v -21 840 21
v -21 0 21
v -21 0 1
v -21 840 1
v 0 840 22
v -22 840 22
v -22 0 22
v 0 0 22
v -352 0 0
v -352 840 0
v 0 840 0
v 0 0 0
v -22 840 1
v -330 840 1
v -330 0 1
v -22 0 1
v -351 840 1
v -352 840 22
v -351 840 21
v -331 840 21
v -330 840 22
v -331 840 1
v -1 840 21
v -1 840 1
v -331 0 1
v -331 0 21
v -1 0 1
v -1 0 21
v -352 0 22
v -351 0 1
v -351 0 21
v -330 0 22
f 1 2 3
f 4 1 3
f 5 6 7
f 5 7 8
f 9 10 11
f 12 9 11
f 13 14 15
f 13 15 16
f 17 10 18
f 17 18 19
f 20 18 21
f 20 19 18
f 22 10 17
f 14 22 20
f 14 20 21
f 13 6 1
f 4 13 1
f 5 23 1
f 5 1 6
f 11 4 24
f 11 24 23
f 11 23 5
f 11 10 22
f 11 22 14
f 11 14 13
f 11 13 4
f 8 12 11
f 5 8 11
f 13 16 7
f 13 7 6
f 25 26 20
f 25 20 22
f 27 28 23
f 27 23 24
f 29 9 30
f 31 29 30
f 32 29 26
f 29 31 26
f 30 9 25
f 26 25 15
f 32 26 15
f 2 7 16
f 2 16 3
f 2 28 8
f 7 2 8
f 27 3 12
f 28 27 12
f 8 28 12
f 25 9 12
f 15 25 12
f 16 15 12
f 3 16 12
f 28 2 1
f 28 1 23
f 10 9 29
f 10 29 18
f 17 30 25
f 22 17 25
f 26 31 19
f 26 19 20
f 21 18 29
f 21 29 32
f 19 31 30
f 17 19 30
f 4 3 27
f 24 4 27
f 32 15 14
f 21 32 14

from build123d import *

# Parameters (mm, degrees)
SKETCH_2_W          = 308
SKETCH_2_H          = 840
EXTRUDE_1_DEPTH     = 1
SKETCH_2_3_W        = 22
SKETCH_2_3_H        = 840
EXTRUDE_2_DEPTH     = 22
SKETCH_4_W          = 20
SKETCH_4_H          = 20
CUT_EXTRUDE_1_DEPTH = 840
SKETCH_4_3_W        = 20
SKETCH_4_3_H        = 20
CUT_EXTRUDE_2_DEPTH = 840


with BuildPart() as part:
    # 스케치2 → 보스-돌출1 (new body)
    with BuildSketch(Plane.XY):
        with Locations((-176, 420)):
            Rectangle(SKETCH_2_W, SKETCH_2_H)
    extrude(amount=EXTRUDE_1_DEPTH)

    # 스케치2<3> → 보스-돌출2 (add)
    with BuildSketch(Plane.XY):
        with Locations((-11, 420)):
            Rectangle(SKETCH_2_3_W, SKETCH_2_3_H)
        with Locations((-341, 420)):
            Rectangle(SKETCH_2_3_W, SKETCH_2_3_H)
    extrude(amount=EXTRUDE_2_DEPTH)

    # 스케치4 → 컷-돌출1 (cut)
    with BuildSketch(Plane(origin=(0, 840, 0), x_dir=(1, 0, 0), z_dir=(0, 1, 0))):
        with Locations((-11, -11)):
            Rectangle(SKETCH_4_W, SKETCH_4_H)
    extrude(amount=-CUT_EXTRUDE_1_DEPTH, mode=Mode.SUBTRACT)

    # 스케치4<3> → 컷-돌출2 (cut)
    with BuildSketch(Plane(origin=(0, 840, 0), x_dir=(1, 0, 0), z_dir=(0, 1, 0))):
        with Locations((-341, -11)):
            Rectangle(SKETCH_4_3_W, SKETCH_4_3_H)
    extrude(amount=-CUT_EXTRUDE_2_DEPTH, mode=Mode.SUBTRACT)


solid = part.part
